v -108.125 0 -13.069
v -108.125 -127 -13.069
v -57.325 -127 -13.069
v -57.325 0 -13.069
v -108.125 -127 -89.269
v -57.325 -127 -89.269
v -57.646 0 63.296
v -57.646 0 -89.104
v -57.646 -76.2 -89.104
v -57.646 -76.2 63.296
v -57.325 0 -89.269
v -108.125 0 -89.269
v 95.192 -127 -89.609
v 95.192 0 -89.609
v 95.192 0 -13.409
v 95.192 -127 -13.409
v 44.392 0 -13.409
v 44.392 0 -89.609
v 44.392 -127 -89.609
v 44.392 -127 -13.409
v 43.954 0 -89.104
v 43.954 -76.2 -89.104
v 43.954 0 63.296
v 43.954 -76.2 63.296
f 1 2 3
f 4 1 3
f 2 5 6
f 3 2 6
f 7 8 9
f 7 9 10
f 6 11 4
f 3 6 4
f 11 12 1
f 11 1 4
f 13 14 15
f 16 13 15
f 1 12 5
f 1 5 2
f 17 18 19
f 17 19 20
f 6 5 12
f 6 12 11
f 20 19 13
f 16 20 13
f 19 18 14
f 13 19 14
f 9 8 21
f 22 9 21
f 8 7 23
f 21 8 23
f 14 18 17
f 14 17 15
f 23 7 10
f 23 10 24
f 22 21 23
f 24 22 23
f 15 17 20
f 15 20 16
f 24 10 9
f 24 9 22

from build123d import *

# Parameters (mm, degrees)
F0_W     = 50.8
F0_H     = 76.2
F1_DEPTH = 127
F2_DEPTH = 127
F3_W     = 101.6
F3_H     = 152.4
F4_DEPTH = 76.2


with BuildPart() as f1:
    # F0 (on Front) → F1 (new body)
    with BuildSketch(Plane.XZ):
        with Locations((-82.724614, -51.168678)):
            Rectangle(F0_W, F0_H)
    extrude(amount=F1_DEPTH)

    # F0 (on Front) → F2 (join)
    with BuildSketch(Plane.XZ):
        with Locations((-82.724614, -51.168678)):
            Rectangle(F0_W, F0_H)
        with Locations((69.791613, -51.508864)):
            Rectangle(F0_W, F0_H)
    extrude(amount=F2_DEPTH)


with BuildPart() as f4:
    # F3 (on Front) → F4 (new body)
    with BuildSketch(Plane.XZ):
        with Locations((-6.845852, -12.903737)):
            Rectangle(F3_W, F3_H)
    extrude(amount=F4_DEPTH)


solid = Compound([f1.part, f4.part])
